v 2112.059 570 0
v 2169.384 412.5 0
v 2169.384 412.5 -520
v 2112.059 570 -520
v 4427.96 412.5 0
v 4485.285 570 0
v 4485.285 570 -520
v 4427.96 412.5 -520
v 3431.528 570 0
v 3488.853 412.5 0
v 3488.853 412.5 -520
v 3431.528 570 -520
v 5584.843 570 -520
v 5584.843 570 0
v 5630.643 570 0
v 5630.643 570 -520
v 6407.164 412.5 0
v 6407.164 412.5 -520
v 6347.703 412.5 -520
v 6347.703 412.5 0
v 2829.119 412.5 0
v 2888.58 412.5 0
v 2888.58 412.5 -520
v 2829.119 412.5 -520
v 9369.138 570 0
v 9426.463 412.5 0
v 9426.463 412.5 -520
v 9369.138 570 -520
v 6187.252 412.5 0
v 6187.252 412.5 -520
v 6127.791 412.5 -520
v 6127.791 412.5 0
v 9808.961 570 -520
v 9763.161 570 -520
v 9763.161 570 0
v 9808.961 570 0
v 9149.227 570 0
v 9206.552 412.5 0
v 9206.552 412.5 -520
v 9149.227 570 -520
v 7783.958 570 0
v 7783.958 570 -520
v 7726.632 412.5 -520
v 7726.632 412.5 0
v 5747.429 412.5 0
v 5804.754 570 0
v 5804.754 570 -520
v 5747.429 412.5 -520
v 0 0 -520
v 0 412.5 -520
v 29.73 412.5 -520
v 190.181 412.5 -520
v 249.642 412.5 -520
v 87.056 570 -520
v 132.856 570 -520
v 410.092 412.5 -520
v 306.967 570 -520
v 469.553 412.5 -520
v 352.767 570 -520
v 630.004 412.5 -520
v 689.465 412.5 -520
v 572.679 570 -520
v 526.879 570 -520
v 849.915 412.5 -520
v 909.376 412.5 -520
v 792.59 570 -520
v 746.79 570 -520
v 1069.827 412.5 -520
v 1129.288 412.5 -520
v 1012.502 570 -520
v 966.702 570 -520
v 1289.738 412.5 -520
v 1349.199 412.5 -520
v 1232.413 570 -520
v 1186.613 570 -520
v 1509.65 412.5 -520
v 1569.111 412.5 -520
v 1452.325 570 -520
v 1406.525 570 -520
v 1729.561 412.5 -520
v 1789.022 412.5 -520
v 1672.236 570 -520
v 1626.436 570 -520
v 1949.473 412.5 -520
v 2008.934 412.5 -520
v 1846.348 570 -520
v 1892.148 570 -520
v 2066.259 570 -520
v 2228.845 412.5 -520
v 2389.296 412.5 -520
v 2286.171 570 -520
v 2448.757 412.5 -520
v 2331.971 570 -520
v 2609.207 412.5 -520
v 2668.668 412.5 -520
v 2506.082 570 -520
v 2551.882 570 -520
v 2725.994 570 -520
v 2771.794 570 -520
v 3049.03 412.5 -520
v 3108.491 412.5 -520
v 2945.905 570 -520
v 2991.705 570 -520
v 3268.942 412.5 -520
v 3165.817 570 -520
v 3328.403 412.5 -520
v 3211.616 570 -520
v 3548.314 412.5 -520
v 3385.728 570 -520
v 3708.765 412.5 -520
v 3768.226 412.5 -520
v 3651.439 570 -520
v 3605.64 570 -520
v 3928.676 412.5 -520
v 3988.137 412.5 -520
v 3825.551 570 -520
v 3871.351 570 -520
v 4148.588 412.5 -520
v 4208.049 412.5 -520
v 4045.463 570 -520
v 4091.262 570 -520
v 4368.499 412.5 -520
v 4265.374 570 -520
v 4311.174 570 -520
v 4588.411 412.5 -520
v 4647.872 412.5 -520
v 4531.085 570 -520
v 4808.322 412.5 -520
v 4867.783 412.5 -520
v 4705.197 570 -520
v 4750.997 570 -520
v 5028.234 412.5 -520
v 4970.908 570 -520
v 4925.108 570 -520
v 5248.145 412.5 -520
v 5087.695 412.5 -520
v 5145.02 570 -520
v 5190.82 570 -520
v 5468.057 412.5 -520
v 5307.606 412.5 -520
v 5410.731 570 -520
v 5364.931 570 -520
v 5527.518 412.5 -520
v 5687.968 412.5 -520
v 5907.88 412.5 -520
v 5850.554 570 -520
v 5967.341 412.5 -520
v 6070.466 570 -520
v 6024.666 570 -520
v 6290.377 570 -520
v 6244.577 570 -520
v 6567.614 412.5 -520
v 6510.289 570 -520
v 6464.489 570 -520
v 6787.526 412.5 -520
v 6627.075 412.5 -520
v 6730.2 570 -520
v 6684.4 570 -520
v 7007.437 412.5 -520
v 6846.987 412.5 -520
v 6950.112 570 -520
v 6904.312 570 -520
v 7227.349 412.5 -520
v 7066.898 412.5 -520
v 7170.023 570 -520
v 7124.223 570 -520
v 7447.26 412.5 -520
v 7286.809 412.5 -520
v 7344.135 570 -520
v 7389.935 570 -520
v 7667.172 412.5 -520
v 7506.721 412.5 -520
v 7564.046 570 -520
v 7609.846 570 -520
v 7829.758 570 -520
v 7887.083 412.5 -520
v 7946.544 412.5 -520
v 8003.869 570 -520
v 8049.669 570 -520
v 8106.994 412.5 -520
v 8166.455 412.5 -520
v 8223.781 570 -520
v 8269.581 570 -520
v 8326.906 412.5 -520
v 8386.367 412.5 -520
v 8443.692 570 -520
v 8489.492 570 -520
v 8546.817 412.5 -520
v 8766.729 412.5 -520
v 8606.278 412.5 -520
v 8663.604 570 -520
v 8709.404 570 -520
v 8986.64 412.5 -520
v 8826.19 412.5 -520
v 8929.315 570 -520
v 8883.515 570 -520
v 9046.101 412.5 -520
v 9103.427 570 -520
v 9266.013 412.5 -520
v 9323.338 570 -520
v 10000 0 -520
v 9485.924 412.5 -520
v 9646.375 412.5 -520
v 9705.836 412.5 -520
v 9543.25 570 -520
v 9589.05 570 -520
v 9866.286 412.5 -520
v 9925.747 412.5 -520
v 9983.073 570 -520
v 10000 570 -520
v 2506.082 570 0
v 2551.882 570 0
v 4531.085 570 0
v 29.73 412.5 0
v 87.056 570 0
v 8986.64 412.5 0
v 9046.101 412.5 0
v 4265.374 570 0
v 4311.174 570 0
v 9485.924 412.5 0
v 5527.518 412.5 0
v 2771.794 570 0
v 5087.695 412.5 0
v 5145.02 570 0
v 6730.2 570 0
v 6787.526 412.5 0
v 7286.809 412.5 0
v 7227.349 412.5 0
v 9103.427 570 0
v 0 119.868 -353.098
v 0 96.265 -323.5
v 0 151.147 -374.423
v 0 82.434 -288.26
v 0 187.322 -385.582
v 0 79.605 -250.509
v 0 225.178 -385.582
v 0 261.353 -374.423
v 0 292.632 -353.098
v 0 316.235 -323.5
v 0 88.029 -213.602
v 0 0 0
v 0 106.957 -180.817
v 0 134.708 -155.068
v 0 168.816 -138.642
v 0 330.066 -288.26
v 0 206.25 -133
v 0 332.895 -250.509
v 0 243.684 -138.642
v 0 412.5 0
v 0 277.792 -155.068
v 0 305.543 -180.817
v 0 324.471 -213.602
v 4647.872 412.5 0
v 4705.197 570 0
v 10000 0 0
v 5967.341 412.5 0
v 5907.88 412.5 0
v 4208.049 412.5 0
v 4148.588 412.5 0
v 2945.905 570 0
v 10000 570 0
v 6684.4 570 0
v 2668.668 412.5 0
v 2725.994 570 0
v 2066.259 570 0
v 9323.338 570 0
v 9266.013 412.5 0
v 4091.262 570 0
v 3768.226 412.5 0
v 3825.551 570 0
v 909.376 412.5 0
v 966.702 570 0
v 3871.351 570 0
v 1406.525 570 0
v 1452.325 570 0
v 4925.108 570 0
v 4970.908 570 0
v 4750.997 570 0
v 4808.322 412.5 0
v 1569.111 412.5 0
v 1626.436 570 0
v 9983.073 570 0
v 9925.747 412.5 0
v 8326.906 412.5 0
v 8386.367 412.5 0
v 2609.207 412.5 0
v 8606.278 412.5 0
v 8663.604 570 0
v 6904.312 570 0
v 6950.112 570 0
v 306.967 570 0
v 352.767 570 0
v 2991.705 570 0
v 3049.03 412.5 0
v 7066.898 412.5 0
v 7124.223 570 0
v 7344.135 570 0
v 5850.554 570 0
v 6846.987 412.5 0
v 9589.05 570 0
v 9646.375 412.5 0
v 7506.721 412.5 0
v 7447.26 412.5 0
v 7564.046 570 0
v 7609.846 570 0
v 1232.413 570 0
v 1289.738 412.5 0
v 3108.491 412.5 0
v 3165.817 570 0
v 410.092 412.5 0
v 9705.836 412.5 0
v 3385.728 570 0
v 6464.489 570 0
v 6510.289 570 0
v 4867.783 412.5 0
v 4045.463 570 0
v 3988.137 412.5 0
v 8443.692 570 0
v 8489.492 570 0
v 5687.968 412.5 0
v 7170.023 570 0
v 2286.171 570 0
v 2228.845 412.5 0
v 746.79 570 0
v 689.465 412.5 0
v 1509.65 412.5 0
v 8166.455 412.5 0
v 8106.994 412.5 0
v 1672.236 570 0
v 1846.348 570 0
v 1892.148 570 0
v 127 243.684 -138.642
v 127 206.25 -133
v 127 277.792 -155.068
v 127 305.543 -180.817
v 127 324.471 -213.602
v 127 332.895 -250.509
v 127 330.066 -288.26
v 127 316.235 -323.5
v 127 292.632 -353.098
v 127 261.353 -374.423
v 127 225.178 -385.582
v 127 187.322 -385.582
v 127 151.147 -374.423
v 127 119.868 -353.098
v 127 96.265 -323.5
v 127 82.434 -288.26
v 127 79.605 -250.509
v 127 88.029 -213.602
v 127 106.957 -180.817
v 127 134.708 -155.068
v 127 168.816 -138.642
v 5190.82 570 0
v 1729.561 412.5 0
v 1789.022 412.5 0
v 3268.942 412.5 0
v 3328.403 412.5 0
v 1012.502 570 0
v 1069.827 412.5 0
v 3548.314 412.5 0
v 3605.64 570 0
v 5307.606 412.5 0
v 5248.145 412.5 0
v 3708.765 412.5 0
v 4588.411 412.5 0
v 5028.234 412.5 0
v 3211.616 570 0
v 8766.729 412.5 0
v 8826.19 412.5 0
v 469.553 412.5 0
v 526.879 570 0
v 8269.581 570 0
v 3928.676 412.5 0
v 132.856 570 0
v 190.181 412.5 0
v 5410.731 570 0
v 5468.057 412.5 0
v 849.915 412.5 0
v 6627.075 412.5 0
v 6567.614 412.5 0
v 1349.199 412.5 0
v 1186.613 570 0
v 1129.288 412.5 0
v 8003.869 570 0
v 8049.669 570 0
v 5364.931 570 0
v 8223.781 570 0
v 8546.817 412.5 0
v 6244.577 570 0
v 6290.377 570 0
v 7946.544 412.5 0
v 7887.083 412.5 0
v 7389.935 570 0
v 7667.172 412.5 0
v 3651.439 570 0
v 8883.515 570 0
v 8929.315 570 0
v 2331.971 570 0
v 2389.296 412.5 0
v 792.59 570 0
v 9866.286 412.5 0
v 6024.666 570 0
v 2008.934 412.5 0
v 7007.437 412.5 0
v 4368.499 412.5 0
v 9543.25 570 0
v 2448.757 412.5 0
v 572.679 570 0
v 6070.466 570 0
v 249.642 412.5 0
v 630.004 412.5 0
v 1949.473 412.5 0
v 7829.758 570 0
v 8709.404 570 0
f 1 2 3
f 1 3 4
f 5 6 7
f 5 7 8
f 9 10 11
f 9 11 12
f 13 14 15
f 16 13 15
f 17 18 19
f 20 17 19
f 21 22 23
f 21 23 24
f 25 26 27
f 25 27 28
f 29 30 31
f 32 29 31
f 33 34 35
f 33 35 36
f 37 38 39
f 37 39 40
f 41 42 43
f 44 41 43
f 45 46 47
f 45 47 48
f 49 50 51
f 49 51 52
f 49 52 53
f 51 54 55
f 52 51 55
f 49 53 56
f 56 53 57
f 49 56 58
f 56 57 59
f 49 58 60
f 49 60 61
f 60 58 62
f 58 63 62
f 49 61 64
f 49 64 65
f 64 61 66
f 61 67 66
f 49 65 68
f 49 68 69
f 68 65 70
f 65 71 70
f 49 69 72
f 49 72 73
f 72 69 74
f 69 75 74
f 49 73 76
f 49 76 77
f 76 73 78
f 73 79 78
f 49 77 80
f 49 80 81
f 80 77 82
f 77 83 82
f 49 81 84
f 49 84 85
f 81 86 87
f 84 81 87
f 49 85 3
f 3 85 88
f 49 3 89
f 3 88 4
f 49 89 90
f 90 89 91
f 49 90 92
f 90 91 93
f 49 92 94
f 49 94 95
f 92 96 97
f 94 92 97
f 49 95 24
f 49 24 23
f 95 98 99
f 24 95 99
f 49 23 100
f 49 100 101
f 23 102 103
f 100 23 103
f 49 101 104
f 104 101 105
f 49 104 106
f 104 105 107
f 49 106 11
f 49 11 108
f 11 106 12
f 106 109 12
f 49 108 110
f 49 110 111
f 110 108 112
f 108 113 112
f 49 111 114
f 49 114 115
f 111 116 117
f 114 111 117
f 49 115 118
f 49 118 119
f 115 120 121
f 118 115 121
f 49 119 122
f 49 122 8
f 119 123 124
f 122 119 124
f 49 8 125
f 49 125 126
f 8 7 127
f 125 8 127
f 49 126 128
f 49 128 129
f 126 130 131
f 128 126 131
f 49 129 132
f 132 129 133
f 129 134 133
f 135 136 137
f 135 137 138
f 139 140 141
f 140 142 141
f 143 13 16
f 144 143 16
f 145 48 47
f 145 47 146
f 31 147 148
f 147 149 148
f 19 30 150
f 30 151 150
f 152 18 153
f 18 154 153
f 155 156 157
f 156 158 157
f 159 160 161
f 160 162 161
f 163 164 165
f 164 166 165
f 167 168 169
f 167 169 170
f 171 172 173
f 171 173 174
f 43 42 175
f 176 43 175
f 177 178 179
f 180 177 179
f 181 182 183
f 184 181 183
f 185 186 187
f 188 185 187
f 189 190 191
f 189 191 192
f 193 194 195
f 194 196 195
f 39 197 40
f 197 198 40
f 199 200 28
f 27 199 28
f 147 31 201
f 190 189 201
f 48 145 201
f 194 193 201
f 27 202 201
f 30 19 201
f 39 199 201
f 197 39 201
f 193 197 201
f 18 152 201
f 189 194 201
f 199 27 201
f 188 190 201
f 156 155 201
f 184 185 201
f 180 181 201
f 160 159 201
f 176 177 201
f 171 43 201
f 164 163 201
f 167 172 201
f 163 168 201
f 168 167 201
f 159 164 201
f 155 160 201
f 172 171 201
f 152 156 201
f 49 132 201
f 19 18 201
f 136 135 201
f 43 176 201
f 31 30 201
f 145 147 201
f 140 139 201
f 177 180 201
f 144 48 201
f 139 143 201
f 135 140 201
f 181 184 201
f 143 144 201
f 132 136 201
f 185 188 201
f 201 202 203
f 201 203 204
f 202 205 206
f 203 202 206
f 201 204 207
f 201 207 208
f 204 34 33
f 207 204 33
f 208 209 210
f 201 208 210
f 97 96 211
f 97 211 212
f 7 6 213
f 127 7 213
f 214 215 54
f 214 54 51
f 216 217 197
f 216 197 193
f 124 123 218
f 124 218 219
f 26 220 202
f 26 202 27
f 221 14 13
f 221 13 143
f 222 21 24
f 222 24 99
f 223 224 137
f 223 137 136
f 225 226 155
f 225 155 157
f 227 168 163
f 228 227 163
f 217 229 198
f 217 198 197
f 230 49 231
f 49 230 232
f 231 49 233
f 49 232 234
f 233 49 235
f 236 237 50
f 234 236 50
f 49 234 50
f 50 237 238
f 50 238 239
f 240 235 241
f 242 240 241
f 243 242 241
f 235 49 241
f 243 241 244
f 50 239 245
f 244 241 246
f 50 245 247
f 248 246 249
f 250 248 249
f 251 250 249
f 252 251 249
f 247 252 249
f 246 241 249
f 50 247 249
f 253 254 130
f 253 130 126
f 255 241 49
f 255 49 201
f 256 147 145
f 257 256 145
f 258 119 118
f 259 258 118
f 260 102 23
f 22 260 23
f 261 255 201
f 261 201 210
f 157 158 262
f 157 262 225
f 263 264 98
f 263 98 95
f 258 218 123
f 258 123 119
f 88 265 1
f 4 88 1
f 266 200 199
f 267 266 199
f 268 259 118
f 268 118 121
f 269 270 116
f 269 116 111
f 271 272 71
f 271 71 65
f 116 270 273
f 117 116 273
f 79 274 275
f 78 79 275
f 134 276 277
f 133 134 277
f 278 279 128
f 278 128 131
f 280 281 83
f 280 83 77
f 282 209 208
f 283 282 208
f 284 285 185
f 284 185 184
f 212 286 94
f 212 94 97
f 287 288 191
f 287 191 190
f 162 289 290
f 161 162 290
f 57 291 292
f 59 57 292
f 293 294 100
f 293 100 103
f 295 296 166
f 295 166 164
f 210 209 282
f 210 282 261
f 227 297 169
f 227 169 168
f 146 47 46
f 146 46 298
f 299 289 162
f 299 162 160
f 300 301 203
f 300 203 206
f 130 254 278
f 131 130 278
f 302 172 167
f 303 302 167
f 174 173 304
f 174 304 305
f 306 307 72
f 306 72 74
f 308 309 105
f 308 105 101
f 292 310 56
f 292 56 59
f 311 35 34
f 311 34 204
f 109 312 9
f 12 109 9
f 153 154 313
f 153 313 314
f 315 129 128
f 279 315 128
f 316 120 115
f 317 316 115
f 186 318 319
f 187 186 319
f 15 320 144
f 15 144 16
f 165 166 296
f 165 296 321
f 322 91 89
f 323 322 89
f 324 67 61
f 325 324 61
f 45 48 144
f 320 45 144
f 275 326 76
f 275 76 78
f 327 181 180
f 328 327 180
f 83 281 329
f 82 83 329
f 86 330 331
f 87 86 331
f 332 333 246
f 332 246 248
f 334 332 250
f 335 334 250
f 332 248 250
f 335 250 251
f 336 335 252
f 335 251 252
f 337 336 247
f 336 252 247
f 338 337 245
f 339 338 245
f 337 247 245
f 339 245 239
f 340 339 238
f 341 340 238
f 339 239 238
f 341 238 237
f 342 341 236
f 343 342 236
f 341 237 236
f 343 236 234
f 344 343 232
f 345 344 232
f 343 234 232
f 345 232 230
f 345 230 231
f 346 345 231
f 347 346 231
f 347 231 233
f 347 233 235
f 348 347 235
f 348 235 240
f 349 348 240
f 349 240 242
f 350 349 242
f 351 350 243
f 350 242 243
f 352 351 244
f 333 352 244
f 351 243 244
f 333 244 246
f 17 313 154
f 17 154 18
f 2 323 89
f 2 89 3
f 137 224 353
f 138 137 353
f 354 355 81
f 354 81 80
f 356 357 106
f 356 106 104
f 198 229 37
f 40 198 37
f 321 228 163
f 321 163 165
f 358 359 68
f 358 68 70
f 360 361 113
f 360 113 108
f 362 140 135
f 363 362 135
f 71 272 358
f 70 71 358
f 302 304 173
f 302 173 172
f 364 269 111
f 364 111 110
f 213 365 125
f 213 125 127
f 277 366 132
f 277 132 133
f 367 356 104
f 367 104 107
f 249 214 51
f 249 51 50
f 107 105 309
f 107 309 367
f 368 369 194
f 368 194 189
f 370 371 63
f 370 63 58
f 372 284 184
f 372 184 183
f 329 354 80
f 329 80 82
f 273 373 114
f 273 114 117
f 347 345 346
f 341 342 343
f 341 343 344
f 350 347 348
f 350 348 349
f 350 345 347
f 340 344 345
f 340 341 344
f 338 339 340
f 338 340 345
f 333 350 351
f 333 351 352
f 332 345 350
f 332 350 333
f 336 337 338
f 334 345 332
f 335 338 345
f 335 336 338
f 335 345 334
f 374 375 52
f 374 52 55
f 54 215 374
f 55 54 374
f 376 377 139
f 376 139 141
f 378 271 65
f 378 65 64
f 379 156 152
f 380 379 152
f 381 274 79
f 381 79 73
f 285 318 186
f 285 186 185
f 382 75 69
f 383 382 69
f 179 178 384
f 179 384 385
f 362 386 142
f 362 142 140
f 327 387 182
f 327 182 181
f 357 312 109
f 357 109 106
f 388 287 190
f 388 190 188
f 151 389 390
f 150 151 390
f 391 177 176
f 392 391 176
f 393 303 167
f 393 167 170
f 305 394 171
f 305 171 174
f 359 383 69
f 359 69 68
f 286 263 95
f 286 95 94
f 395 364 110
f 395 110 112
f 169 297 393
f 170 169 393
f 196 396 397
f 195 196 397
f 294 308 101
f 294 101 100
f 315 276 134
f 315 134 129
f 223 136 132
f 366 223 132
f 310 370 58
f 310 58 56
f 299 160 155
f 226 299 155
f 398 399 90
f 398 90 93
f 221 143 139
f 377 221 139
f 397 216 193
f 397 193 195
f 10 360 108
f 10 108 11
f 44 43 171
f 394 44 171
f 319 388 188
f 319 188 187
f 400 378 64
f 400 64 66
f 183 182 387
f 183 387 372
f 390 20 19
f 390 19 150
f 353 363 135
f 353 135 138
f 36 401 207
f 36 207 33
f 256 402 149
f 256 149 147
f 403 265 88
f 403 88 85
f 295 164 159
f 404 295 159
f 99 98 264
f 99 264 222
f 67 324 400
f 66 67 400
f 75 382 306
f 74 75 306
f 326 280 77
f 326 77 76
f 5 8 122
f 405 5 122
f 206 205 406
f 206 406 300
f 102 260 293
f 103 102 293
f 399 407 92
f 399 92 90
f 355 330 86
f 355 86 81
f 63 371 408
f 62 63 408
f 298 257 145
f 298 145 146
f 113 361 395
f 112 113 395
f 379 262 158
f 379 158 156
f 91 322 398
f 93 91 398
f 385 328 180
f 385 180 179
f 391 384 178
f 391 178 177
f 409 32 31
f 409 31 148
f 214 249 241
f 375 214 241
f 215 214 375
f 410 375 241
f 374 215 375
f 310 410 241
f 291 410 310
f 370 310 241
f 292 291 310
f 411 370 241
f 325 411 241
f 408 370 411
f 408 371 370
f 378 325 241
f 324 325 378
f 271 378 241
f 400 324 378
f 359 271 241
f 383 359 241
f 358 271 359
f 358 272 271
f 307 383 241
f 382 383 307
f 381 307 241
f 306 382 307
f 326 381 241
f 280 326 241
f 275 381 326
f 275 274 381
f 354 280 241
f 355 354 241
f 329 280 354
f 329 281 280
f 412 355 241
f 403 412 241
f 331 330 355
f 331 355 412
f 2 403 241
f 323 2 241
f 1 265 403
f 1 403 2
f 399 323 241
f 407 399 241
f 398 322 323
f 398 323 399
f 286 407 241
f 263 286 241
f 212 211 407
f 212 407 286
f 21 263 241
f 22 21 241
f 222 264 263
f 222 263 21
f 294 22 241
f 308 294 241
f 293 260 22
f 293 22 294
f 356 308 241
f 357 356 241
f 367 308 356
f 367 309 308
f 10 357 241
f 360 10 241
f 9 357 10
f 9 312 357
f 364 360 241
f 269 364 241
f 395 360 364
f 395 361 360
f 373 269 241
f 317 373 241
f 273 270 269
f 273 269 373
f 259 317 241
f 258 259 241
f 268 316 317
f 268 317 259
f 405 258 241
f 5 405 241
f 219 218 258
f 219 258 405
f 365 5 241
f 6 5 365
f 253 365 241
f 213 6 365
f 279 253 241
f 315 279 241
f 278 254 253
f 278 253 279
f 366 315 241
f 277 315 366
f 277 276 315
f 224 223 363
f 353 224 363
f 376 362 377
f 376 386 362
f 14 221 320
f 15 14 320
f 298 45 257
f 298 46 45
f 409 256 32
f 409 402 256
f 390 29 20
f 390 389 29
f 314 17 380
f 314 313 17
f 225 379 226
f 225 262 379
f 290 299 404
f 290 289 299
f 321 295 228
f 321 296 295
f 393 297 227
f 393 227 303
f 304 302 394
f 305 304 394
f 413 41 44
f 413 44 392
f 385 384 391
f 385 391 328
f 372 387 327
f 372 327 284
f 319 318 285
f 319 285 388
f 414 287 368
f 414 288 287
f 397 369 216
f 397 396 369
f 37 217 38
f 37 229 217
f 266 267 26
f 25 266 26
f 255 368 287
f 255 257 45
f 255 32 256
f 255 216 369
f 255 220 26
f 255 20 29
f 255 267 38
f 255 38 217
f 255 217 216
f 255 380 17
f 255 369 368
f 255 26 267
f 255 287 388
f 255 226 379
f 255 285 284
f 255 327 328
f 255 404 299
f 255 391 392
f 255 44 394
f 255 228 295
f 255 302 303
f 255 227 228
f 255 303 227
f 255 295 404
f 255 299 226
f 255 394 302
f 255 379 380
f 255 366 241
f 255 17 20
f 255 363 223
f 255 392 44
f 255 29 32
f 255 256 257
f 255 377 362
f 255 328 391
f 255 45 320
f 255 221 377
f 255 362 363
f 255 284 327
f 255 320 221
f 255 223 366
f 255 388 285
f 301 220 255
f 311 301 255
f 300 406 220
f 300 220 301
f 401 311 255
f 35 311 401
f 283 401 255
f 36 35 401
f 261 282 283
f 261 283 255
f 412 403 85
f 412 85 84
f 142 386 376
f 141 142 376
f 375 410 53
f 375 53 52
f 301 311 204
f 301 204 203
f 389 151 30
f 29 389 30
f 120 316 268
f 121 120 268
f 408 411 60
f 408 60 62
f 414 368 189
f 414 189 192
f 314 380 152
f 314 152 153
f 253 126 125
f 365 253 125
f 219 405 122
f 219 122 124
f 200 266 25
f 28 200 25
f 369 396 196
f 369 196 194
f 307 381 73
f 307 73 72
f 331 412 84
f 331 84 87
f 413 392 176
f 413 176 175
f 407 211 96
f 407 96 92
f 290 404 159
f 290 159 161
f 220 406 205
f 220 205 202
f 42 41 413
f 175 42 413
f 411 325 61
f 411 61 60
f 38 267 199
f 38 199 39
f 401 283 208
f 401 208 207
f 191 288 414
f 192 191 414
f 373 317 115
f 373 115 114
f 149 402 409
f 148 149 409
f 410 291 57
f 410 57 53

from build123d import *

# Parameters (mm, degrees)
BLANKSKE_W         = 10000
BLANKSKE_H         = 570
BLANK_DEPTH        = 520
TOOTHCUTSIM_DEPTH  = 10030.720833602
TEETHCUTS_COUNT    = 46
TEETHCUTS_PITCH    = 219.9114855
SKETCH1_R          = 127
CUT_EXTRUDE1_DEPTH = 127


with BuildPart() as part:
    # BlankSke → Blank (new body)
    with BuildSketch(Plane.XY):
        with Locations((5000, 285)):
            Rectangle(BLANKSKE_W, BLANKSKE_H)
    extrude(amount=-BLANK_DEPTH)

    # TooCutSkeSim → ToothCutSim (cut, through all)
    with BuildSketch(Plane.XY):
        Polygon((29.730475877, 412.5), (-29.730475877, 412.5), (-87.065032618, 570.0254), (87.065032618, 570.0254), align=None)
    toothcutsim = extrude(amount=-TOOTHCUTSIM_DEPTH, mode=Mode.SUBTRACT)

    # TeethCuts: ToothCutSim ×46
    with Locations(*[(i * TEETHCUTS_PITCH, 0, 0) for i in range(1, TEETHCUTS_COUNT)]):
        add(toothcutsim, mode=Mode.SUBTRACT)

    # Sketch1 → Cut-Extrude1 (cut)
    with BuildSketch(Plane.ZY):
        with Locations((-260, 206.25)):
            Circle(SKETCH1_R)
    extrude(amount=-CUT_EXTRUDE1_DEPTH, mode=Mode.SUBTRACT)


solid = part.part
